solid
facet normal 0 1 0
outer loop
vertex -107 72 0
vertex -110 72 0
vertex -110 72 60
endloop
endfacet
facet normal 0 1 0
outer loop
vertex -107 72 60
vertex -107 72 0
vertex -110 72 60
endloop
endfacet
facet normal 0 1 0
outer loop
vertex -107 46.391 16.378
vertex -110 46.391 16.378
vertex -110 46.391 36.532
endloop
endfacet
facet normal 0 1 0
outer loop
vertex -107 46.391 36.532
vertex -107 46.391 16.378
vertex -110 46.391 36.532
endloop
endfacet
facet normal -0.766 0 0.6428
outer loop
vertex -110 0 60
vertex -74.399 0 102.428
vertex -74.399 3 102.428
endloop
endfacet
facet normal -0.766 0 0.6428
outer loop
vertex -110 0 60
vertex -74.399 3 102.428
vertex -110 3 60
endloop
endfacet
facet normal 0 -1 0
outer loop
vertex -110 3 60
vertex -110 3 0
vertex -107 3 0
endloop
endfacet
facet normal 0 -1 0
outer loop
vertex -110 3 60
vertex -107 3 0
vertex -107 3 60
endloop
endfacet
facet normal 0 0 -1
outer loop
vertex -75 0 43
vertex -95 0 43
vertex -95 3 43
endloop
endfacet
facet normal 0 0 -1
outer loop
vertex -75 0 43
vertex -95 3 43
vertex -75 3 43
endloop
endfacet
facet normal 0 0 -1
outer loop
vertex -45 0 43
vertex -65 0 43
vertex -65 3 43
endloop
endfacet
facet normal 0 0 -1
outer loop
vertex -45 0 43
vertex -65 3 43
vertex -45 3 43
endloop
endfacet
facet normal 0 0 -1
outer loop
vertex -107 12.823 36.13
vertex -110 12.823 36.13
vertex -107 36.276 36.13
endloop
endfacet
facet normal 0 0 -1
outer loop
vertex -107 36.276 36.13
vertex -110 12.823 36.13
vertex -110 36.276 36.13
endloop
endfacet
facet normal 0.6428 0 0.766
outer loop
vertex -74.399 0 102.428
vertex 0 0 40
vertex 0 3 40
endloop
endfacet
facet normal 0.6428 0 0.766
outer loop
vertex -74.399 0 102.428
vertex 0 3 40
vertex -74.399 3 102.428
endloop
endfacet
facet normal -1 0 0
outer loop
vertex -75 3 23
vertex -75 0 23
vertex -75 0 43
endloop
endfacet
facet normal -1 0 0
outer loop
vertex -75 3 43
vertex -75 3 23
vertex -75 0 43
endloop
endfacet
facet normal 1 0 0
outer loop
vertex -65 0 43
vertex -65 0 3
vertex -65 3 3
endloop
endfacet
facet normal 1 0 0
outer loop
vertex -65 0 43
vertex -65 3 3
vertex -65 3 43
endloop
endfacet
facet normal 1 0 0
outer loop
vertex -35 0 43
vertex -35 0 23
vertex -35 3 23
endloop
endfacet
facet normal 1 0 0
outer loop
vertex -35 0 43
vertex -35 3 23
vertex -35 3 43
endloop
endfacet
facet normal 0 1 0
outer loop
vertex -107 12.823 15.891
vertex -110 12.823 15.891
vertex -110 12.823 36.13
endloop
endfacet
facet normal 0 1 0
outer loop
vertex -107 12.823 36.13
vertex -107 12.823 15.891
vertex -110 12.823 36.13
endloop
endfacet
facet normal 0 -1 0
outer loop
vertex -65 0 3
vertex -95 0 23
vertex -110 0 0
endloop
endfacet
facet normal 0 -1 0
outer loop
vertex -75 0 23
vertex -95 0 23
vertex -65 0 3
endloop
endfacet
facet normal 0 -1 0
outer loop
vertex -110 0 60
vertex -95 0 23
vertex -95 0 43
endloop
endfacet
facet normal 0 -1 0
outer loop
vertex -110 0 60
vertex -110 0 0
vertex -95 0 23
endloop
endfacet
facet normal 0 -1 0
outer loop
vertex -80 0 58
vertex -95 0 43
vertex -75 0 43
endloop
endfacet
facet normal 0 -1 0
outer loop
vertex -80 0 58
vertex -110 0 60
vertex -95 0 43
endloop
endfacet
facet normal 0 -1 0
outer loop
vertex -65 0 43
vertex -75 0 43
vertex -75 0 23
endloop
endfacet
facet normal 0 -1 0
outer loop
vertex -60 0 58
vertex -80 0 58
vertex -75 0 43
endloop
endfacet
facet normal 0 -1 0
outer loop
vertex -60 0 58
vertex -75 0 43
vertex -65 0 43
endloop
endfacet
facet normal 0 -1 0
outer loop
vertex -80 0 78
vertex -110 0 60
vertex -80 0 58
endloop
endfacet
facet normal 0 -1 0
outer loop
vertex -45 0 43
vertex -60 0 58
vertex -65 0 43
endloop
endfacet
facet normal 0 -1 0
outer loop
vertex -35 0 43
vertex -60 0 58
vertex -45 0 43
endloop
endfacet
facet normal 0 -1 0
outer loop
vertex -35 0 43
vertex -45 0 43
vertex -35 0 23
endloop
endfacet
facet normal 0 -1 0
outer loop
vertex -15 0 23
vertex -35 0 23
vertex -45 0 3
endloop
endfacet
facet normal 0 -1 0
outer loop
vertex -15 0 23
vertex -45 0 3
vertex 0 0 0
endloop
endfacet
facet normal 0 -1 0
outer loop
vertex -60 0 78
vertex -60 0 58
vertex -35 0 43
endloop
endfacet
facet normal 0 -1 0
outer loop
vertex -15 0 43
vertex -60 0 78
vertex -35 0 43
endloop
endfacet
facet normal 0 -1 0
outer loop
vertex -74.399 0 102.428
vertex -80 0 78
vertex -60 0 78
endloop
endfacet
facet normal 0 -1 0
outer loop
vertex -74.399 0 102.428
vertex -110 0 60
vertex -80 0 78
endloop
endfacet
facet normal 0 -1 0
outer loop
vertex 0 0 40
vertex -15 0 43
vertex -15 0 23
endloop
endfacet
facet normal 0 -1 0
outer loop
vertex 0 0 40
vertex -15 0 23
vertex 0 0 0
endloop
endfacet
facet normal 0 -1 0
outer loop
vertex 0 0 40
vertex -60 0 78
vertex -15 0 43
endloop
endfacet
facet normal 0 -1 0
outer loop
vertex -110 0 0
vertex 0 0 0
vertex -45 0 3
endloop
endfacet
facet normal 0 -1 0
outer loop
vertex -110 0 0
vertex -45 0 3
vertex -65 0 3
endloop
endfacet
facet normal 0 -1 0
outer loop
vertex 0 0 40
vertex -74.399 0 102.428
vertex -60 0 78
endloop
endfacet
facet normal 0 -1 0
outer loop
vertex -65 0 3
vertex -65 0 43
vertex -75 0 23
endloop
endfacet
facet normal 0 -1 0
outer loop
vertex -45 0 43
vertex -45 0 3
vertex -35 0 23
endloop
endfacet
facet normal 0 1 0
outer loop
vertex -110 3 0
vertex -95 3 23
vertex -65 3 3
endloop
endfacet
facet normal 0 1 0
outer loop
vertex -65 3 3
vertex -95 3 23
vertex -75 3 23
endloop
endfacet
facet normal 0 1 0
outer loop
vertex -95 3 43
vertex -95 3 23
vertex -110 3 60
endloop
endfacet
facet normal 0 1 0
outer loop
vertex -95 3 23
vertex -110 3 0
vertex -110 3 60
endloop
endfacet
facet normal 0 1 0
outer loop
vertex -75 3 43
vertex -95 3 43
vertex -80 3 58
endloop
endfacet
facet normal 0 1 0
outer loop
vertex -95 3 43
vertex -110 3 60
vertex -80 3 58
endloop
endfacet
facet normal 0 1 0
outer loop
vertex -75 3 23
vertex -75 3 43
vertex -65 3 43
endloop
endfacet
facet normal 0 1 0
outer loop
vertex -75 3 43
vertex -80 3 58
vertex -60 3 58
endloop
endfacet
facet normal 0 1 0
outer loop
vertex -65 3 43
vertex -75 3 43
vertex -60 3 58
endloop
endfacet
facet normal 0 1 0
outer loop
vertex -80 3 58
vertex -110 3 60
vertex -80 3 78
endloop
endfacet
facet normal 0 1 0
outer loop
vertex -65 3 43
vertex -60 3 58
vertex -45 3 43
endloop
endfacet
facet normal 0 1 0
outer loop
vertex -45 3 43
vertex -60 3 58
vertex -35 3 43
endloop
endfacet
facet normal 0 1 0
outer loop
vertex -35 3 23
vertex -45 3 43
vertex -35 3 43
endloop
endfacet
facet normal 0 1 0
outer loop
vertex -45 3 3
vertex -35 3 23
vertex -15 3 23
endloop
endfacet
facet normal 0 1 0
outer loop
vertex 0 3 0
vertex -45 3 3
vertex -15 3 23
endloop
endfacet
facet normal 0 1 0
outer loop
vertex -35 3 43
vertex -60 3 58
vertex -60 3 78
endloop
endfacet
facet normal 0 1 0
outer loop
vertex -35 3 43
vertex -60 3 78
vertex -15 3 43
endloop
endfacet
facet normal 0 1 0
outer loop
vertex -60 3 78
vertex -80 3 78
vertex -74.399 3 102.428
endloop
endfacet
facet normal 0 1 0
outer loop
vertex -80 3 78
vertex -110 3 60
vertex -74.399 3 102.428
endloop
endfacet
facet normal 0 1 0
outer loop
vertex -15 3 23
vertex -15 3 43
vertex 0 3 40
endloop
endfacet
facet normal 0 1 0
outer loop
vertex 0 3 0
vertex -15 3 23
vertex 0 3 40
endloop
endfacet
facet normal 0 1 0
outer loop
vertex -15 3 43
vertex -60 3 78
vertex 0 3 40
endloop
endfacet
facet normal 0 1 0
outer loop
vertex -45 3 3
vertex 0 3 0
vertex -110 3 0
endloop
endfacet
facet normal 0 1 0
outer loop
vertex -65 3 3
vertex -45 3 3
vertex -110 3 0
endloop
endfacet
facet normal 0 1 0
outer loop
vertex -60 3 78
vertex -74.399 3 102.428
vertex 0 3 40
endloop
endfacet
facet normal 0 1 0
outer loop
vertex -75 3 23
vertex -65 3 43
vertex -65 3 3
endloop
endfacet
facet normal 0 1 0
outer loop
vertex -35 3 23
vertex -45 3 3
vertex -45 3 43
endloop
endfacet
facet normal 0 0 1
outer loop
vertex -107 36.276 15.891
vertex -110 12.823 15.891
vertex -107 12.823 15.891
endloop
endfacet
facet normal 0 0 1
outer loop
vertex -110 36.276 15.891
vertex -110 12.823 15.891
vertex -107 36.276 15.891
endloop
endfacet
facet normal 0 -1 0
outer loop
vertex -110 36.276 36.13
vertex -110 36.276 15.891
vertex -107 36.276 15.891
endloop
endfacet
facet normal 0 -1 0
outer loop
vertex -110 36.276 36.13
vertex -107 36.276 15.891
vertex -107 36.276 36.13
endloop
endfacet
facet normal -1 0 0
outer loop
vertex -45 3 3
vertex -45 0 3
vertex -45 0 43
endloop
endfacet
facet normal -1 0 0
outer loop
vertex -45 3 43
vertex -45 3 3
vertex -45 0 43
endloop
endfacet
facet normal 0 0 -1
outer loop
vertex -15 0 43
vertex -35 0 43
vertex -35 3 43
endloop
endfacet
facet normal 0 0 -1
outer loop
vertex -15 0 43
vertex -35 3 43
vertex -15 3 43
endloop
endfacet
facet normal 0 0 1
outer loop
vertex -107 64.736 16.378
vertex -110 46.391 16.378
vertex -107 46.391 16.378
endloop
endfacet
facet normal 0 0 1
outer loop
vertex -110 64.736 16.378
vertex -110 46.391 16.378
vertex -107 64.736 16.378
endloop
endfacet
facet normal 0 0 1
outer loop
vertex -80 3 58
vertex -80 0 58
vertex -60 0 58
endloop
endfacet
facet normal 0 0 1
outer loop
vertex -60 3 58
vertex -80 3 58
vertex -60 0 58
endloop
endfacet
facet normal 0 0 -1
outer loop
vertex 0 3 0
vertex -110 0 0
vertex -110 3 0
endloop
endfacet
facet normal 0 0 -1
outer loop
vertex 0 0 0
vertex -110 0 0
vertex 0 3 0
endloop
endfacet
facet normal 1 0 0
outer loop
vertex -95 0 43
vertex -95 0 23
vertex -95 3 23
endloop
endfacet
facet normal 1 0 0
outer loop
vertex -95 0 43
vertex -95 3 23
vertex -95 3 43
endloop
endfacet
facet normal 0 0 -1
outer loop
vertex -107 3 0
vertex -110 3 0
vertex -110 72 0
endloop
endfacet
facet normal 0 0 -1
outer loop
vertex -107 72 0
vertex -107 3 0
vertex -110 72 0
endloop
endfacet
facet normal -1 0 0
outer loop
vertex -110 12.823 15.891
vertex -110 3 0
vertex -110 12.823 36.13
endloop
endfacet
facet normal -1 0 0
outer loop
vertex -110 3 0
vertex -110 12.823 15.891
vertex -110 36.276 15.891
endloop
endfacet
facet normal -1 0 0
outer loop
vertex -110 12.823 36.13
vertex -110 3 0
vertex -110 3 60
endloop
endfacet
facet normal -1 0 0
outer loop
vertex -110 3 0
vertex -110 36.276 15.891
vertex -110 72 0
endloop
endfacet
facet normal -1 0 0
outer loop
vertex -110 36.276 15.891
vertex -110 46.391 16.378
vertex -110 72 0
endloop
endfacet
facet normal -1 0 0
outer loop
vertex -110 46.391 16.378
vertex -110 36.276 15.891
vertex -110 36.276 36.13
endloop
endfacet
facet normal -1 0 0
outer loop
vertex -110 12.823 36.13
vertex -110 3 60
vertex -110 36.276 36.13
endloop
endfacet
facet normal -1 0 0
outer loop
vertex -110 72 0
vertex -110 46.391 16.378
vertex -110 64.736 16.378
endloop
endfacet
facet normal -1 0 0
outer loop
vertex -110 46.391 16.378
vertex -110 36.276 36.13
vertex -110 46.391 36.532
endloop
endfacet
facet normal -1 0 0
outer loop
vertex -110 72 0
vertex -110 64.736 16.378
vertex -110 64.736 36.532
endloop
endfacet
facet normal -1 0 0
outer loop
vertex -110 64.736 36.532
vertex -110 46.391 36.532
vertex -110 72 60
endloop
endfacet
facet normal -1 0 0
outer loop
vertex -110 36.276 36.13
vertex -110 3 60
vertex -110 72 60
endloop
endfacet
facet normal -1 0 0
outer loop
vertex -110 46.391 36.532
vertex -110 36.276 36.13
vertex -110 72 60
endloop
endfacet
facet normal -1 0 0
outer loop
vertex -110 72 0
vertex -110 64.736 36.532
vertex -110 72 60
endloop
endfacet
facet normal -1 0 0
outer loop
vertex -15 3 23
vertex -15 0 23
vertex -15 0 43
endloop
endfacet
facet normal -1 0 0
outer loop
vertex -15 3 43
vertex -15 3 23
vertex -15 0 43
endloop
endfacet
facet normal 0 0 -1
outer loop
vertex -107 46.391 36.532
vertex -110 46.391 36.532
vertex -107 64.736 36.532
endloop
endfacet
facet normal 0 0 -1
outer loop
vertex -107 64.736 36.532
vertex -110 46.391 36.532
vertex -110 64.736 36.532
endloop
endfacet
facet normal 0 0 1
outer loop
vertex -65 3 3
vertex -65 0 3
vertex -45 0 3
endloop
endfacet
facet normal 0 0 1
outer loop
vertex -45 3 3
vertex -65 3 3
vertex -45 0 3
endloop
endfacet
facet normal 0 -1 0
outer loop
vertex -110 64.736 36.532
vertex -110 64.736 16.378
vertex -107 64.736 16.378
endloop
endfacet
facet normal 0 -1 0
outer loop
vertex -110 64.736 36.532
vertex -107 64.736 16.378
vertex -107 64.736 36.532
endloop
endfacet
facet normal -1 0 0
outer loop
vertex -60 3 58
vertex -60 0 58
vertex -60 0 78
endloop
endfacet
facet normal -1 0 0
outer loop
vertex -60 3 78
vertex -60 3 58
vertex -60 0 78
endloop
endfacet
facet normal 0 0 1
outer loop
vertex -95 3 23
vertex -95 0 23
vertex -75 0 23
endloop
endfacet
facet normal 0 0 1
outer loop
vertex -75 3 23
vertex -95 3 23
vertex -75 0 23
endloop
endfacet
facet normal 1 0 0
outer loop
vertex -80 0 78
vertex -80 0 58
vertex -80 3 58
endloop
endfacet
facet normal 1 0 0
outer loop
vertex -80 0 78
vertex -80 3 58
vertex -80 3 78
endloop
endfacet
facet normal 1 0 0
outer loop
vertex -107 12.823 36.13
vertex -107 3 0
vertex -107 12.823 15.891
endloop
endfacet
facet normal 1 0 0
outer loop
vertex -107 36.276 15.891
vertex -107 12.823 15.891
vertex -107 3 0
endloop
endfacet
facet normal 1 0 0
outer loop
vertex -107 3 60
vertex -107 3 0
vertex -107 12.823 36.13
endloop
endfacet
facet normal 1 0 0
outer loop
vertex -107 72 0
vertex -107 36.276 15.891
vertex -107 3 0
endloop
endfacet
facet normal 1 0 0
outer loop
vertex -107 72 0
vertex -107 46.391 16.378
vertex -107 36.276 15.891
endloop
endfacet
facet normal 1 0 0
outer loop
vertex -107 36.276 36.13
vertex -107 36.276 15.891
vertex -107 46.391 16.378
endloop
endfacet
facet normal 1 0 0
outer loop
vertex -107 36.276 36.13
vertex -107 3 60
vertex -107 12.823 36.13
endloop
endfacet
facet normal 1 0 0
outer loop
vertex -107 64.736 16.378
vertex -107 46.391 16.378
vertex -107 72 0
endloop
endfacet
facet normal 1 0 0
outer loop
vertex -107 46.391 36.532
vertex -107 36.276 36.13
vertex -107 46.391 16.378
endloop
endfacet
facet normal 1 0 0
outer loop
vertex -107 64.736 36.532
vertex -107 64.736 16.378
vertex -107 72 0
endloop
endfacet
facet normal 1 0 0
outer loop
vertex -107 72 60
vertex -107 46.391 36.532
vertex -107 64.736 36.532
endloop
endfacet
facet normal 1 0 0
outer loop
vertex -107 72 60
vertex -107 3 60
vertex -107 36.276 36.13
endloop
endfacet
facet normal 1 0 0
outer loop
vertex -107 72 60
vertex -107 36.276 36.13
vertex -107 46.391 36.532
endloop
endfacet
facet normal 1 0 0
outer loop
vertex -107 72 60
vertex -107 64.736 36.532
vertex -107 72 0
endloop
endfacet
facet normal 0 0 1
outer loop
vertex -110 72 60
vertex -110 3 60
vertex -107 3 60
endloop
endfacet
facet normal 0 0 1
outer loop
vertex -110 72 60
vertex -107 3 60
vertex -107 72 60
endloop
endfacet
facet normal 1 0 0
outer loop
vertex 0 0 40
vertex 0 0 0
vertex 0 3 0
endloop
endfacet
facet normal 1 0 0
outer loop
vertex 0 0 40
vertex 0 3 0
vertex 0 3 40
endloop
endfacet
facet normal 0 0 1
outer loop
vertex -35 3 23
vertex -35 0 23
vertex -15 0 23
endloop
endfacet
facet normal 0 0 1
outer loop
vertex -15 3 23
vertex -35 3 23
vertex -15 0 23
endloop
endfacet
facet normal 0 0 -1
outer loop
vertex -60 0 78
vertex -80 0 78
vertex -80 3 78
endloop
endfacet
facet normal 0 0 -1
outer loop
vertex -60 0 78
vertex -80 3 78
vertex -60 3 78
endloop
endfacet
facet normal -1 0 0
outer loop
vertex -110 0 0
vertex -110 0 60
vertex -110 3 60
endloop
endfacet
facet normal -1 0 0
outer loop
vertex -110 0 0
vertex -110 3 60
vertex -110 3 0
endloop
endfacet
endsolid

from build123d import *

# Parameters (mm, degrees)
F1_W     = 20
F1_H     = 20
F1_H_2   = 40
F2_DEPTH = 3
F4_W     = 69
F4_H     = 60
F4_W_2   = 23.4525548294
F4_H_2   = 20.2393522486
F4_W_3   = 18.3444470167
F4_H_3   = 20.1539043337
F5_DEPTH = 3


with BuildPart() as f2:
    # F1 (on Front) → F2 (new body, through all)
    with BuildSketch(Plane.XZ):
        Polygon((-110, 60), (-110, 0), (0, 0), (0, 40), (-74.3987273018, 102.427944639), align=None)
        with Locations((-85, 33)):
            Rectangle(F1_W, F1_H, mode=Mode.SUBTRACT)
        with Locations((-55, 23)):
            Rectangle(F1_W, F1_H_2, mode=Mode.SUBTRACT)
        with Locations((-25, 33)):
            Rectangle(F1_W, F1_H, mode=Mode.SUBTRACT)
        with Locations((-70, 68)):
            Rectangle(F1_W, F1_H, mode=Mode.SUBTRACT)
    extrude(amount=-F2_DEPTH)


with BuildPart() as f5:
    # F4 (on plane+point) → F5 (new body, through all)
    with BuildSketch(Plane.YZ.offset(-110)):
        with Locations((37.5, 30)):
            Rectangle(F4_W, F4_H)
        with Locations((24.549653288, 26.0107456706)):
            Rectangle(F4_W_2, F4_H_2, mode=Mode.SUBTRACT)
        with Locations((55.563442409, 26.454555802)):
            Rectangle(F4_W_3, F4_H_3, mode=Mode.SUBTRACT)
    extrude(amount=F5_DEPTH)


solid = Compound([f2.part, f5.part])
